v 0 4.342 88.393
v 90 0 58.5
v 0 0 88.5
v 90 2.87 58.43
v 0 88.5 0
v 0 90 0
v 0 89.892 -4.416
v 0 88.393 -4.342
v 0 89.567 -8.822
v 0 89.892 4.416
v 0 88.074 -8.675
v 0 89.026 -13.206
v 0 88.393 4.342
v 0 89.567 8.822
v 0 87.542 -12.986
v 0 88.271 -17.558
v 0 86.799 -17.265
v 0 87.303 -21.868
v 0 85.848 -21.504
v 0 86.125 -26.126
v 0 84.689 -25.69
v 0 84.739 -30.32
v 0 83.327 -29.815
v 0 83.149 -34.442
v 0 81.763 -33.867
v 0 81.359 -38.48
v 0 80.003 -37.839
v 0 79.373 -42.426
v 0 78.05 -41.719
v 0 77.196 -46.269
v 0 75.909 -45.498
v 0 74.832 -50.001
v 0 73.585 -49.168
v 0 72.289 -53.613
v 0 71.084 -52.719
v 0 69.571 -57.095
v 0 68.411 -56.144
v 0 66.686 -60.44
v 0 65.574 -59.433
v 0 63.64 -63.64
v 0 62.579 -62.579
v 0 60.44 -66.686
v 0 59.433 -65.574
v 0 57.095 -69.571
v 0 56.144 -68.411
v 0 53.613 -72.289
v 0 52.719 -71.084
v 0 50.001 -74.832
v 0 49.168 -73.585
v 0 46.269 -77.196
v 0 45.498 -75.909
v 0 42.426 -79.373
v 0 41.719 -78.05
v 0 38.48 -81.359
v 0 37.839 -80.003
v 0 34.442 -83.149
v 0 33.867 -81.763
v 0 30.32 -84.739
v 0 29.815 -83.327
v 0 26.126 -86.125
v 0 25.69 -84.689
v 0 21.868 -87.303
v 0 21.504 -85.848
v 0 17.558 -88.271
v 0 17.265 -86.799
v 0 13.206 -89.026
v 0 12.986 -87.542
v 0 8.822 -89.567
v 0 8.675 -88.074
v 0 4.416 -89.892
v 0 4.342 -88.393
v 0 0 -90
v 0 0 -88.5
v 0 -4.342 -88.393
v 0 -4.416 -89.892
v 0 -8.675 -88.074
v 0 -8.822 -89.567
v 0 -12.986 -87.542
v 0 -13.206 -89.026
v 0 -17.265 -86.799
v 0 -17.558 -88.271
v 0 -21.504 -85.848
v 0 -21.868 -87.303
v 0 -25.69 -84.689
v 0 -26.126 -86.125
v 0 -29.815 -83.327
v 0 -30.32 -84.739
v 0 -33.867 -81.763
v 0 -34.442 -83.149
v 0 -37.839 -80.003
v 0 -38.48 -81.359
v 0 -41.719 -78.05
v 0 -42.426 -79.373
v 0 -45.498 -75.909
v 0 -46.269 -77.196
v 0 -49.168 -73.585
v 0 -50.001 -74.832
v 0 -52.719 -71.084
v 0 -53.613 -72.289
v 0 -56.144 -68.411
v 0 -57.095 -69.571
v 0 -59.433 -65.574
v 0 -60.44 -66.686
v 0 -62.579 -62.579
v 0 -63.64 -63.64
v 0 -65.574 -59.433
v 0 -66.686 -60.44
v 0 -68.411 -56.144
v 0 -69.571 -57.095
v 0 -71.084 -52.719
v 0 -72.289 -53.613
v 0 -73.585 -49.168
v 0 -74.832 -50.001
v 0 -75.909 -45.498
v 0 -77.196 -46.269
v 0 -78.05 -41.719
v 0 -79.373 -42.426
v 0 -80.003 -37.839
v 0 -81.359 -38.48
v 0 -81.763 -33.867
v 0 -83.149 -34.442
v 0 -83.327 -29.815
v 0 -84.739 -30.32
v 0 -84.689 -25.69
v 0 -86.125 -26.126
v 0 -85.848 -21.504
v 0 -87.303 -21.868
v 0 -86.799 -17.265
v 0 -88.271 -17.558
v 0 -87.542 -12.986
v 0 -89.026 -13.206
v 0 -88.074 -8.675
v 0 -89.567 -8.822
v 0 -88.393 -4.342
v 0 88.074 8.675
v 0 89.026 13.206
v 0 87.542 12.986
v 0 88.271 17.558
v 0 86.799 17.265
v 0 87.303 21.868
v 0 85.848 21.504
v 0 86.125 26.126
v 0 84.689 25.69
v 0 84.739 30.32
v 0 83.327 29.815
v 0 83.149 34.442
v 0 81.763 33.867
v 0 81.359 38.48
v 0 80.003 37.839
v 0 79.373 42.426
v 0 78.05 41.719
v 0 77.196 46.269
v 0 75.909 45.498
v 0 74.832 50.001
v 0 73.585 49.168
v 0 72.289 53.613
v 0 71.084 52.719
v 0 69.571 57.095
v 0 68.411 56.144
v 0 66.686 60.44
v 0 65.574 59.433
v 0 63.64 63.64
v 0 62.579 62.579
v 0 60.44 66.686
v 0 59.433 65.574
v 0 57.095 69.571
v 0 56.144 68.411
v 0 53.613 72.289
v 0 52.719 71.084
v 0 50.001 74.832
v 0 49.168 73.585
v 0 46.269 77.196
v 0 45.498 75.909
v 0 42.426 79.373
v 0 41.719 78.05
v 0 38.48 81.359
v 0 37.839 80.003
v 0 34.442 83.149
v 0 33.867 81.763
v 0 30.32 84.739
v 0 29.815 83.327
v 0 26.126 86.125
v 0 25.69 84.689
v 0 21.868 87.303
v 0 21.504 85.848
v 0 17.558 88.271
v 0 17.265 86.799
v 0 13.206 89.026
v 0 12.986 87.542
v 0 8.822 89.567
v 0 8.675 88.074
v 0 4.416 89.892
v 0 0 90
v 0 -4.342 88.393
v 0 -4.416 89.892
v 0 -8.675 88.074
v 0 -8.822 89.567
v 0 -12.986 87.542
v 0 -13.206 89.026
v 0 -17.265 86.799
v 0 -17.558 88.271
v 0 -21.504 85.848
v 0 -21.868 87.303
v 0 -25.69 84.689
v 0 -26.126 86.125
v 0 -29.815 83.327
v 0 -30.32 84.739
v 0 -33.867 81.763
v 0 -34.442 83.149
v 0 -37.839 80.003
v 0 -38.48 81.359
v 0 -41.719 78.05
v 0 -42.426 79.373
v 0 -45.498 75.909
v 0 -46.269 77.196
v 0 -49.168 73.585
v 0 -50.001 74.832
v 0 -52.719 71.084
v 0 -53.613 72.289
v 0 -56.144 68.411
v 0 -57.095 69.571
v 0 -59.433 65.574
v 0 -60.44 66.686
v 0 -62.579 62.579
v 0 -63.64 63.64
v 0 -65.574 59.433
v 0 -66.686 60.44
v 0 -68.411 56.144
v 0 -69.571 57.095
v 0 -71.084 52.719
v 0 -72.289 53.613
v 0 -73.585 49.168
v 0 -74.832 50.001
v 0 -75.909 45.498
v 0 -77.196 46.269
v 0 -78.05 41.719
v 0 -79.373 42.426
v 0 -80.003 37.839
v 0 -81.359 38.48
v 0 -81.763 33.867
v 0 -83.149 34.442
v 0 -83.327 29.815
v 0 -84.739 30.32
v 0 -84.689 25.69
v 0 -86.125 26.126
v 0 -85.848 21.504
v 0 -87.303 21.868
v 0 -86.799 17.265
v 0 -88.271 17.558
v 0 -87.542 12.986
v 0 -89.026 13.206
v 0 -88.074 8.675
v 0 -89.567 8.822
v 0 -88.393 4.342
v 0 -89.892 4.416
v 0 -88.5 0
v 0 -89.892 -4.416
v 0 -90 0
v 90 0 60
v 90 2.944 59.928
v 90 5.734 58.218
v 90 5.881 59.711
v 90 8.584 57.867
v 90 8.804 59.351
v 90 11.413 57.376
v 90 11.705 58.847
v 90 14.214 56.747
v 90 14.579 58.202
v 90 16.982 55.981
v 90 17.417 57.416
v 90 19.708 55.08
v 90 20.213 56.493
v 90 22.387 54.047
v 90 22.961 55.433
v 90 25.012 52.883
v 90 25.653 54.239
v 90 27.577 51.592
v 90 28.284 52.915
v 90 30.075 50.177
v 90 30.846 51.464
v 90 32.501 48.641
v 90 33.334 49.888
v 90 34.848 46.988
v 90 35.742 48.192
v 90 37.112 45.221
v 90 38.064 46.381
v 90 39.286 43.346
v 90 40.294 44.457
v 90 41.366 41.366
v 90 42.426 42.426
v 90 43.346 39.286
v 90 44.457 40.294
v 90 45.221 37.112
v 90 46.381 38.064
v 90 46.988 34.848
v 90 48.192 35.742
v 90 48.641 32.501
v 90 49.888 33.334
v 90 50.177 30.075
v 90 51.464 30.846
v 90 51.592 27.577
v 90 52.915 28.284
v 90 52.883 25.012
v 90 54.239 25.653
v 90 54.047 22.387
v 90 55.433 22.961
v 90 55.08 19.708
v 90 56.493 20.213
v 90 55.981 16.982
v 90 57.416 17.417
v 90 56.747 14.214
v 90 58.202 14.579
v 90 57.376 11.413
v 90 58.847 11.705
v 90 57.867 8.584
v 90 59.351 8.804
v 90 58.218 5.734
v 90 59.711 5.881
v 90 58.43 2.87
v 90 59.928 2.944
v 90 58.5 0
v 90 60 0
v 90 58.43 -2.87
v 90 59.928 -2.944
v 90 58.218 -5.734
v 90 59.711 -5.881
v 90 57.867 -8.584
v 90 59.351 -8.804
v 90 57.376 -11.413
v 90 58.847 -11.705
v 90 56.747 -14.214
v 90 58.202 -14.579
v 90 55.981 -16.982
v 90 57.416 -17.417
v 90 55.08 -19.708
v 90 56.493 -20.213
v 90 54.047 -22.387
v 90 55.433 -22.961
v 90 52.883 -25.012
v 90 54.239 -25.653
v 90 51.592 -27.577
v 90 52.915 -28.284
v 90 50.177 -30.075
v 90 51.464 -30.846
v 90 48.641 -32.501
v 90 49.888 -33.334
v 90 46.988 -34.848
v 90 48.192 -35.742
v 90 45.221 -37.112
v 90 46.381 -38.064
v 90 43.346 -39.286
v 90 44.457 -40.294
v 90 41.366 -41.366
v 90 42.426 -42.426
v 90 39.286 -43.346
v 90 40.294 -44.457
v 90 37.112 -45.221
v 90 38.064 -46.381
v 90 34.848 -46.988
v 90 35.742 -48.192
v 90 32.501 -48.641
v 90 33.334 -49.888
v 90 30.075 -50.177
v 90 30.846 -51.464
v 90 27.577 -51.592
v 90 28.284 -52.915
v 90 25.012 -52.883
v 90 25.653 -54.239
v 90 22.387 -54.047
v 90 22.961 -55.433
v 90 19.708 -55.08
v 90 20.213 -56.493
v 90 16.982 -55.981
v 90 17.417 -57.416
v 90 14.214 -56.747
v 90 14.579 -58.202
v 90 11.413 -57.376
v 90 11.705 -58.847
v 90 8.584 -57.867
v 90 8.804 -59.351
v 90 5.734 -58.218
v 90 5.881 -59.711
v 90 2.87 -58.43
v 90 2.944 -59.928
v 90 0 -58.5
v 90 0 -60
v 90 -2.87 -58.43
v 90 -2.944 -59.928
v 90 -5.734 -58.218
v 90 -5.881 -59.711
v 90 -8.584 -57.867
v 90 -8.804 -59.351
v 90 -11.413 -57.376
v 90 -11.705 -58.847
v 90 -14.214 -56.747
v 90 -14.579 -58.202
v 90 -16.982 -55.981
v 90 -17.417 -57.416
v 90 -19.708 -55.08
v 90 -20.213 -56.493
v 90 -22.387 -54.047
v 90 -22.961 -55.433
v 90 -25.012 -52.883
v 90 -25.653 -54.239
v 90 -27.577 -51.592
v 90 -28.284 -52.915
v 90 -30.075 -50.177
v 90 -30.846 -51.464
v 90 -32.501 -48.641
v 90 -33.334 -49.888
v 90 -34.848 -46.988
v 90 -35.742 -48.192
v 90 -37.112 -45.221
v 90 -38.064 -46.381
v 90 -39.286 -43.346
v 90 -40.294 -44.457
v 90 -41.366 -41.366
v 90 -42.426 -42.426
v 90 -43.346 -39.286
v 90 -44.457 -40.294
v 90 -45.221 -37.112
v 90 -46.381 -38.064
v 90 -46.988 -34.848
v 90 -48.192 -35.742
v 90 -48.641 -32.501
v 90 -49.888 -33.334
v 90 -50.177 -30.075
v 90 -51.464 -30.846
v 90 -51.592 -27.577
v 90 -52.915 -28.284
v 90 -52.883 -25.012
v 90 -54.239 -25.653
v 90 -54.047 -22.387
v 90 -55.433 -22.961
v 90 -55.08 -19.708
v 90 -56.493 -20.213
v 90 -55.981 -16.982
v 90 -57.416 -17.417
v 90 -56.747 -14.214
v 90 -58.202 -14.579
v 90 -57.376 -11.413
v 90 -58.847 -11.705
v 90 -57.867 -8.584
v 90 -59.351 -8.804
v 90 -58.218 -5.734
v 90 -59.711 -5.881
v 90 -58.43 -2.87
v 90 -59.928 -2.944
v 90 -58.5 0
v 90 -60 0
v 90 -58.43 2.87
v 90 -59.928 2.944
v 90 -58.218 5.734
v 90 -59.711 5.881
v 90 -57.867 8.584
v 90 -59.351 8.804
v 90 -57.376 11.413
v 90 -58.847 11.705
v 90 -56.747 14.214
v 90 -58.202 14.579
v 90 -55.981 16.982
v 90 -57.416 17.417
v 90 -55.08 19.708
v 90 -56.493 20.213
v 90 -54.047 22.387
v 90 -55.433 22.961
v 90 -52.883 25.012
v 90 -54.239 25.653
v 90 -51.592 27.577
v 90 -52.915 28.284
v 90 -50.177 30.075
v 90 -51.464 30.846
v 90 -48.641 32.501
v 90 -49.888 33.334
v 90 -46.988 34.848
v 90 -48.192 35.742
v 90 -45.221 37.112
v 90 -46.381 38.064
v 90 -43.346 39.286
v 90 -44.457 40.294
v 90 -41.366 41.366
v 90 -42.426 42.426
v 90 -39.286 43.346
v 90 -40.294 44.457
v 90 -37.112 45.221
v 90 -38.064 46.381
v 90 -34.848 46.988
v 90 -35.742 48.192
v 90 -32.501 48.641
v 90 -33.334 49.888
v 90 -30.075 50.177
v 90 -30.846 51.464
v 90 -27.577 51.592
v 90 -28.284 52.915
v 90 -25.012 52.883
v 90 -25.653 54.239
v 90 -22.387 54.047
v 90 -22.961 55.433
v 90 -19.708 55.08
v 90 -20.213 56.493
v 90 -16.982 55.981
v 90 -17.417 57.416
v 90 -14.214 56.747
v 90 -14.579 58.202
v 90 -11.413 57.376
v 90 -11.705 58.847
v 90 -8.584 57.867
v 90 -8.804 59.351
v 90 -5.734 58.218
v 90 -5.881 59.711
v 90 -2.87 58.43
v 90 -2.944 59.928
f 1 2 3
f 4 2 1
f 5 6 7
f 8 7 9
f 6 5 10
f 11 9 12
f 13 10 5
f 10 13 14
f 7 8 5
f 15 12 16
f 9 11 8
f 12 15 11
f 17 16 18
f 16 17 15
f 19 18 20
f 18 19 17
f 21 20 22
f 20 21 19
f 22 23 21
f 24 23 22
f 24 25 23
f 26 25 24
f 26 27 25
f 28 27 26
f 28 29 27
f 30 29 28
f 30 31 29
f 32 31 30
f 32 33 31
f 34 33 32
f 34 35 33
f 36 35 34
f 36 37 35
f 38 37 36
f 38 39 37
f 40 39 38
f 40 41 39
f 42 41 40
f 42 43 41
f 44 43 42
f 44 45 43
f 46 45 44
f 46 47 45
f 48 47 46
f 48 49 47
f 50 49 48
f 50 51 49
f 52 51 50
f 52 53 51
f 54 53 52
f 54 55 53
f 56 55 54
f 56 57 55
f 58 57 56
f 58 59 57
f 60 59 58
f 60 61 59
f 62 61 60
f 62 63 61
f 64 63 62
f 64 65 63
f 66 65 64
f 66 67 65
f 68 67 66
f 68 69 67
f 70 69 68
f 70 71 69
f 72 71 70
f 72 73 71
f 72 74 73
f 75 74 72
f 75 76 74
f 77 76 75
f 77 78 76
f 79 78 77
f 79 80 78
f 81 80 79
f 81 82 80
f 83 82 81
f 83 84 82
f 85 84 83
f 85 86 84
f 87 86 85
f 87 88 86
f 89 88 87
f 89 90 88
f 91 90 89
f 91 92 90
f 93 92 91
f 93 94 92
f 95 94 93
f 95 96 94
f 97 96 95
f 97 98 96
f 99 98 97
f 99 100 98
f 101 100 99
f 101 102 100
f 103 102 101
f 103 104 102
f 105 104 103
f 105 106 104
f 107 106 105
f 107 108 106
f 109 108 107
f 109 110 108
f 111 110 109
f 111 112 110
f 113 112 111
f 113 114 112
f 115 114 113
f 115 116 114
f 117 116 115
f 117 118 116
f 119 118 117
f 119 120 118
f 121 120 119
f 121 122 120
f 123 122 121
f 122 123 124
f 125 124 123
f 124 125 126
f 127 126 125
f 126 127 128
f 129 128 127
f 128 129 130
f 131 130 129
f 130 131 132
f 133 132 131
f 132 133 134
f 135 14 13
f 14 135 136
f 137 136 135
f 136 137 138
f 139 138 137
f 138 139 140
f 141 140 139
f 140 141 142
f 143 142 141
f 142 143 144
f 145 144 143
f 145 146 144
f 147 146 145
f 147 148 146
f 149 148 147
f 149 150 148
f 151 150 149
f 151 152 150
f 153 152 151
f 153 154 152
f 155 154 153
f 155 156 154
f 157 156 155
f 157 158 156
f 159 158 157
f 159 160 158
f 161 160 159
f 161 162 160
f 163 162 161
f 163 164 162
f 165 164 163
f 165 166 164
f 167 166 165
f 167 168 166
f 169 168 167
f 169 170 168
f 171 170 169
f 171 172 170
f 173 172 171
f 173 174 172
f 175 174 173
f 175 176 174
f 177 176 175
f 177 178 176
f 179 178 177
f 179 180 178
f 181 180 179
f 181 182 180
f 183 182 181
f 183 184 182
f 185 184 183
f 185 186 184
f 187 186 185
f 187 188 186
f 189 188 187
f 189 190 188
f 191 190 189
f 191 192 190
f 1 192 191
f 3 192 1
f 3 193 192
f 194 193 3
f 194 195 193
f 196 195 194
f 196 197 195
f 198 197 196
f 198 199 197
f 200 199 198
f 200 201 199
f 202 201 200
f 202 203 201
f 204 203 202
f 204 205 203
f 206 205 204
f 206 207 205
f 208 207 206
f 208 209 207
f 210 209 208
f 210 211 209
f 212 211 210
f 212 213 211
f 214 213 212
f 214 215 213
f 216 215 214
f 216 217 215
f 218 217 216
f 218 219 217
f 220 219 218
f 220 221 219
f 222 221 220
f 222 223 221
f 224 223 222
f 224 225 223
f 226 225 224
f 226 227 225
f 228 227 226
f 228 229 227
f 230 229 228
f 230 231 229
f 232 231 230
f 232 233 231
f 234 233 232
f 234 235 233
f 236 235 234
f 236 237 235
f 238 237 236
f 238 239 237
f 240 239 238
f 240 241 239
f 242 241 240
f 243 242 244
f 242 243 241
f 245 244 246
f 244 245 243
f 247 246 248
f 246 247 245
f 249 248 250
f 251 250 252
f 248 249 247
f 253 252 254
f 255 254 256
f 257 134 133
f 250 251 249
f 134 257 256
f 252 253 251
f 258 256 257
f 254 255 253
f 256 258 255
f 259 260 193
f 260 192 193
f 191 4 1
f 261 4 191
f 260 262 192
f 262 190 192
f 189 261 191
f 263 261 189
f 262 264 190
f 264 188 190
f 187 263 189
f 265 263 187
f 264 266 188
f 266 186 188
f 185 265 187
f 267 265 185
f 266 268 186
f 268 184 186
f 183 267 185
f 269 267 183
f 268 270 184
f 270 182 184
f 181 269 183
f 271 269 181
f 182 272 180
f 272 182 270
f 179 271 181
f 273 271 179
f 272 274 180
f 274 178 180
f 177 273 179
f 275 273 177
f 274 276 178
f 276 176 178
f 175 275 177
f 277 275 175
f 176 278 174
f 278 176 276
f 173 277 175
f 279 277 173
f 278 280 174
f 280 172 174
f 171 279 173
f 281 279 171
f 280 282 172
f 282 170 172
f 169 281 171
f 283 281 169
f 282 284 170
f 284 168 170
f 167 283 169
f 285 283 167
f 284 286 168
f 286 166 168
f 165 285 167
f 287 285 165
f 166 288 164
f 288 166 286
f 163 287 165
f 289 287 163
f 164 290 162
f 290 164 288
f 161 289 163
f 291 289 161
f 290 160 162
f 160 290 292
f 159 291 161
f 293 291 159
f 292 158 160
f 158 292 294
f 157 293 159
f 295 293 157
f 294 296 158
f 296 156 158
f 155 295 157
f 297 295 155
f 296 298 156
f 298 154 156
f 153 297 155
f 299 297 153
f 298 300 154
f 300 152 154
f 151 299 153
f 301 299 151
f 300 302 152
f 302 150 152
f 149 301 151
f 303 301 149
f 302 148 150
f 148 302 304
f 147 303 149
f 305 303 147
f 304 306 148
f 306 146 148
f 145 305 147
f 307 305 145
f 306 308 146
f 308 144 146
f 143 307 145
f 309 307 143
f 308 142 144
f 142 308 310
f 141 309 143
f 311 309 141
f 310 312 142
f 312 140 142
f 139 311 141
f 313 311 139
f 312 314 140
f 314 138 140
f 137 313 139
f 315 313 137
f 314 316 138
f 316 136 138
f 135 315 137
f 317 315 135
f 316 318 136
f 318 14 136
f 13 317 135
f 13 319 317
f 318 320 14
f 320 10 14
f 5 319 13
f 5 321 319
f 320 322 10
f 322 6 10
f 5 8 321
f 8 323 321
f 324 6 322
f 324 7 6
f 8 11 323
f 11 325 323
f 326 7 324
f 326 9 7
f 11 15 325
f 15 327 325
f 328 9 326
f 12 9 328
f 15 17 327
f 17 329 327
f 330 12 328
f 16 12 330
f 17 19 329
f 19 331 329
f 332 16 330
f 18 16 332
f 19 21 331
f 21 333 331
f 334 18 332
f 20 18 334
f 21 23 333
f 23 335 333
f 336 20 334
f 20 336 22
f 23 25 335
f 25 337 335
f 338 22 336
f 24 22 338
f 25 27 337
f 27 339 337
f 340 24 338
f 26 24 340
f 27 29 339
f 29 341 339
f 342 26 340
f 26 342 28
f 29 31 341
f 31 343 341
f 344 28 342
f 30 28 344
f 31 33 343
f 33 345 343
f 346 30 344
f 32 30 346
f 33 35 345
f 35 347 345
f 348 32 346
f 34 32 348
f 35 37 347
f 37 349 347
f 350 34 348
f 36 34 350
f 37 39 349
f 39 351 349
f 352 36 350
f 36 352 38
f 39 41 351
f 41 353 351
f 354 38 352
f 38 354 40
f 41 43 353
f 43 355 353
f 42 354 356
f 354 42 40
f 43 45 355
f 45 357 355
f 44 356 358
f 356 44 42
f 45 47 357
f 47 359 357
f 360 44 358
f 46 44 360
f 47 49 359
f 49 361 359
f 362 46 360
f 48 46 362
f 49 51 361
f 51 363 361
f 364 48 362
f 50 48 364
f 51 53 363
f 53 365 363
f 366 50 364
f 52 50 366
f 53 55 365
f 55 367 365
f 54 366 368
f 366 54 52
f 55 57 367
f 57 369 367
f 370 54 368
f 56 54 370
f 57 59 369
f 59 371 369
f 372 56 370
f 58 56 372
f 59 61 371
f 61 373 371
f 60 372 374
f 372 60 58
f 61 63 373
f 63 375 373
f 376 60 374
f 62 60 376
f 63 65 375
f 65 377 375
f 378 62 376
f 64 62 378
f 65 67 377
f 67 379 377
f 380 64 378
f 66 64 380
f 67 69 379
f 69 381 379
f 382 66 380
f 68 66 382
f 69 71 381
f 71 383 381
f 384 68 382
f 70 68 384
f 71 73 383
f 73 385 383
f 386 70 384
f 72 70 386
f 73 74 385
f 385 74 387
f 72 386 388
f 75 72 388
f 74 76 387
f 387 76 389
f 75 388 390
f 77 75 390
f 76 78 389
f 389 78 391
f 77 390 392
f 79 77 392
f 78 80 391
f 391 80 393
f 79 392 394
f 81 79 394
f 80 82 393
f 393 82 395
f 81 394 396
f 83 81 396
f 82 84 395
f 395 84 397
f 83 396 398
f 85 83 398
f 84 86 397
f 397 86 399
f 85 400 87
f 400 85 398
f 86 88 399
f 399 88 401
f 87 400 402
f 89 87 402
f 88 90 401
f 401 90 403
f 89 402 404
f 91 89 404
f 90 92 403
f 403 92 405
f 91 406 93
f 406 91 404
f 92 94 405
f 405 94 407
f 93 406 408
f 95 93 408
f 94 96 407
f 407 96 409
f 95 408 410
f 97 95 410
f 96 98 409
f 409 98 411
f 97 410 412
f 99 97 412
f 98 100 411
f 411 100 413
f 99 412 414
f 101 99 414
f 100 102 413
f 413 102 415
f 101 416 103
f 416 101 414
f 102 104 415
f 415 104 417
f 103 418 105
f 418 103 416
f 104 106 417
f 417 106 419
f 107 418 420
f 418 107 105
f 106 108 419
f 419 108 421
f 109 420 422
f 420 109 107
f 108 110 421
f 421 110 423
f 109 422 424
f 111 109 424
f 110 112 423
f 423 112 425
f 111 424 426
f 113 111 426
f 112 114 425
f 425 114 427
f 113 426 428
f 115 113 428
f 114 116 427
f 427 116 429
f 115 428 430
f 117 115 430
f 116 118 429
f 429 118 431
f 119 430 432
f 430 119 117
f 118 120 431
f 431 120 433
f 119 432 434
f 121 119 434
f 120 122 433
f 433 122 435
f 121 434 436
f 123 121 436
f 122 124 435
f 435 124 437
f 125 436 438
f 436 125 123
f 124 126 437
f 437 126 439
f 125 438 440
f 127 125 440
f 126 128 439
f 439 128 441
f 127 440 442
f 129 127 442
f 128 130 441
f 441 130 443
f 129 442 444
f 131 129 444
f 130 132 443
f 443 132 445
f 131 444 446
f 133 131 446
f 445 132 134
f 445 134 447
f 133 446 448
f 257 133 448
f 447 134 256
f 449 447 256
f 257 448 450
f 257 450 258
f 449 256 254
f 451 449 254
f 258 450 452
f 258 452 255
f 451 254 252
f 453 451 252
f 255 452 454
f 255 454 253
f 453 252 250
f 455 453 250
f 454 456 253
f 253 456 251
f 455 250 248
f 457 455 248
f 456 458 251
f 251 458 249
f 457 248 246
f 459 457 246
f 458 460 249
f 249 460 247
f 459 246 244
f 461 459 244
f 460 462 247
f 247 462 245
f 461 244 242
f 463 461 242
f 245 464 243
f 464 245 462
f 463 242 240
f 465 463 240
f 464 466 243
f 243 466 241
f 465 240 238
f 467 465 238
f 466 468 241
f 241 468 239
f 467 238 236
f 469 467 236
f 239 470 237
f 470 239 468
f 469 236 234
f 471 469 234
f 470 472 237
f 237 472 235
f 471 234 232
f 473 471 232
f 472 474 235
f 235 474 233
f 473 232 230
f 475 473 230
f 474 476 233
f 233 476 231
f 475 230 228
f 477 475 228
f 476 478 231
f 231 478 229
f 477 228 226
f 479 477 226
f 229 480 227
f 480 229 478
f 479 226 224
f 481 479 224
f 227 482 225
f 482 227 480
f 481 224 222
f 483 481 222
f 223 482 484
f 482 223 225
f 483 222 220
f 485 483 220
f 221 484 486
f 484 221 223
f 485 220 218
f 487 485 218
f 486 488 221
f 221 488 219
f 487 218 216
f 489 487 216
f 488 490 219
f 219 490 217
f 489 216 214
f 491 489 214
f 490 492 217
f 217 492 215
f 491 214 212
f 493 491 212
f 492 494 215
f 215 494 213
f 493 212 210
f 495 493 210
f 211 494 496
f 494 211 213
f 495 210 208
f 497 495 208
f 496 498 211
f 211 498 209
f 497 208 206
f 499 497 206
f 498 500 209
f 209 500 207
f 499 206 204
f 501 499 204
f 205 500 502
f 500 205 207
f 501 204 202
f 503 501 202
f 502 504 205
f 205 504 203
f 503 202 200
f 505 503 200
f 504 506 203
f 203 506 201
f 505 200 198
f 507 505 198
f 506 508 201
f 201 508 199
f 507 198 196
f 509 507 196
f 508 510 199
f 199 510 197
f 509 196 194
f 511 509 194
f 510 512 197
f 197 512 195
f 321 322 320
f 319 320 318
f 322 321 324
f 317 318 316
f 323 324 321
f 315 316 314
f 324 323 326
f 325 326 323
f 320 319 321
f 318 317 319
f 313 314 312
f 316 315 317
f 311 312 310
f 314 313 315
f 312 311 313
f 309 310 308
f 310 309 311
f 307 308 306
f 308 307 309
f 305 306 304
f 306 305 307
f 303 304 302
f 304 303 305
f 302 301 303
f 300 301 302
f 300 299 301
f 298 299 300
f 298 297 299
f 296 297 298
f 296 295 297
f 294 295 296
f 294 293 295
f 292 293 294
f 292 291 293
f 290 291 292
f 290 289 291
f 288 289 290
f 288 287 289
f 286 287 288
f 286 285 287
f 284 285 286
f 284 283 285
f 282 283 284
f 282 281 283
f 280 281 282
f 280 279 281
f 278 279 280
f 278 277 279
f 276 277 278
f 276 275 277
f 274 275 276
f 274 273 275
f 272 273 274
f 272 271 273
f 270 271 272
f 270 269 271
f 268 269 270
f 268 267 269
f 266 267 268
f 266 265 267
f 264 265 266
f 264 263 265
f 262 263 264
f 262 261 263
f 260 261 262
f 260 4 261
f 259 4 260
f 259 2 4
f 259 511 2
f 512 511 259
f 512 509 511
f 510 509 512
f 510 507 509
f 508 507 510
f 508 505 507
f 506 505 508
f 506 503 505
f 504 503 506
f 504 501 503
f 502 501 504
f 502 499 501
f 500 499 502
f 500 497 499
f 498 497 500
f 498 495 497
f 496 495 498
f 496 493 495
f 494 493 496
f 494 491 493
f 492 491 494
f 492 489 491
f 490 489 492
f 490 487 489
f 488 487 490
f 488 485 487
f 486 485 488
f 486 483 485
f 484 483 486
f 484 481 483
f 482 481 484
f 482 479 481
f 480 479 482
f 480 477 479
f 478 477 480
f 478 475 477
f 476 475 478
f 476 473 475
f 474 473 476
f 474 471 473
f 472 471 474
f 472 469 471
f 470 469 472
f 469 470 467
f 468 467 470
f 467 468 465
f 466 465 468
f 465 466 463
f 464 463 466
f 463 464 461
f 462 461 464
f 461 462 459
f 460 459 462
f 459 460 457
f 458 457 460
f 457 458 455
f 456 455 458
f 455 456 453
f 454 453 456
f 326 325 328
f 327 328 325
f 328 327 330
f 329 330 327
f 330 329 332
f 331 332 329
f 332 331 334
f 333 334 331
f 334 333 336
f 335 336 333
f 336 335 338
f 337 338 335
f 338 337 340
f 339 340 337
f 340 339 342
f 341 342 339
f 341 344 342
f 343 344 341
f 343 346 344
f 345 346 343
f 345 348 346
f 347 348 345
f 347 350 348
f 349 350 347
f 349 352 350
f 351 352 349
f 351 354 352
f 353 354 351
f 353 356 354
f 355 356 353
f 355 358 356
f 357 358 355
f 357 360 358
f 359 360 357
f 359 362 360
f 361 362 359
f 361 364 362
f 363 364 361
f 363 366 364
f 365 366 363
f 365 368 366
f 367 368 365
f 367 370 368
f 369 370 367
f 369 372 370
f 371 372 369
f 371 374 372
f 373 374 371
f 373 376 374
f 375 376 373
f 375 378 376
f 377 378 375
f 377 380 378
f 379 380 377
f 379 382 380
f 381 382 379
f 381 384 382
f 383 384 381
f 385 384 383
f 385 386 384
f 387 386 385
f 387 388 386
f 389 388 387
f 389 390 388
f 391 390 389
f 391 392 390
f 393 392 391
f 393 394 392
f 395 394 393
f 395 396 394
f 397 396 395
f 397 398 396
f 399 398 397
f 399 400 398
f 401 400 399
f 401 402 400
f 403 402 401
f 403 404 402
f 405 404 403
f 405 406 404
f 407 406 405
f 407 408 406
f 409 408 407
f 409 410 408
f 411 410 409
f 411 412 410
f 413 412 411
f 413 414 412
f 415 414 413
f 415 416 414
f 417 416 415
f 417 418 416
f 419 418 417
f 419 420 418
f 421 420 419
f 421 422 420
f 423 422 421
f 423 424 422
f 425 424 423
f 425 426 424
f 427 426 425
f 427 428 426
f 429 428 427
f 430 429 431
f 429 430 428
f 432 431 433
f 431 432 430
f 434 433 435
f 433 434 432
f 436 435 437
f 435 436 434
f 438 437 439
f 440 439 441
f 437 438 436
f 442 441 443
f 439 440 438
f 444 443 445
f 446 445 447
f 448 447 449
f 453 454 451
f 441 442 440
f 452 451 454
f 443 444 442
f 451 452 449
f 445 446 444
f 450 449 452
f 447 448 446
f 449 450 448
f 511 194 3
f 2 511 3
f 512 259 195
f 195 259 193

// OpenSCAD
// file: ../utils/parametric_helpers.scad
/**
 * @file parametric_helpers.scad
 * @brief Parametric 3D Modeling Utility Library
 * @details Contains shared constants, modules, and functions for geometric arraying,
 *          rounded cylinders, and coordinate transformations.
 * 
 * Copyright (c) 2026 AEGIS-TF1 Systems Development Group.
 */

// Global Constants
PI = 3.14159265358979323846;
GOLDEN_RATIO = 1.618033988749894;
TOLERANCE = 0.05;

// Functions
function deg2rad(d) = d * PI / 180.0;
function rad2deg(r) = r * 180.0 / PI;
function lerp(a, b, t) = a + (b - a) * t;

// Modules

/**
 * @brief Distributes children shapes in a circular array
 * @param n Number of instances
 * @param radius Radius of array circle
 */
module circular_array(n, radius) {
    for (i = [0 : n - 1]) {
        angle = i * 360.0 / n;
        rotate([0, 0, angle])
        translate([radius, 0, 0])
        children();
    }
}

/**
 * @brief Distributes children shapes in a linear array along X-axis
 * @param n Number of instances
 * @param spacing Distance between instances
 */
module linear_array(n, spacing) {
    for (i = [0 : n - 1]) {
        translate([i * spacing, 0, 0])
        children();
    }
}

/**
 * @brief Hollow cylinder (tube) along Z-axis
 * @param h Tube height
 * @param outer_r Outer radius
 * @param inner_r Inner radius
 * @param fn Resolution
 */
module tube(h, outer_r, inner_r, fn=64) {
    difference() {
        cylinder(h=h, r=outer_r, center=true, $fn=fn);
        cylinder(h=h + TOLERANCE * 2.0, r=inner_r, center=true, $fn=fn);
    }
}

/**
 * @brief Torus shape centered at origin
 * @param R Major radius (ring center distance)
 * @param r Minor radius (cross section radius)
 * @param fn Resolution
 */
module torus(R, r, fn=64) {
    rotate_extrude($fn=fn)
    translate([R, 0, 0])
    circle(r=r, $fn=fn);
}

/**
 * @brief Rounded cylinder (filleted top and bottom edges) using Minkowski
 * @param h Height
 * @param r Radius
 * @param fillet_r Edge radius
 * @param fn Resolution
 */
module rounded_cylinder(h, r, fillet_r, fn=64) {
    minkowski() {
        cylinder(h = h - 2.0 * fillet_r, r = r - fillet_r, center = true, $fn = fn);
        sphere(r = fillet_r, $fn = fn);
    }
}

/**
 * @brief 2D fillet helper
 * @param r Fillet radius
 */
module fillet_2d(r) {
    difference() {
        square([r, r]);
        translate([r, r])
        circle(r=r, $fn=64);
    }
}

/**
 * @brief 2D chamfer helper
 * @param size Chamfer length
 */
module chamfer_2d(size) {
    polygon(points=[[0,0], [size,0], [0,size]]);
}

/**
 * @brief Ball bearing assembly (inner ring, outer ring, balls)
 */
module bearing_assembly(inner_dia, outer_dia, width, num_balls=10) {
    color("silver")
    difference() {
        // Outer ring
        cylinder(h=width, r=outer_dia / 2.0, center=true, $fn=64);
        cylinder(h=width + 1.0, r=(outer_dia + inner_dia)/4.0 + (outer_dia - inner_dia)/8.0 * 0.8, center=true, $fn=64);
    }
    color("silver")
    difference() {
        // Inner ring
        cylinder(h=width, r=(outer_dia + inner_dia)/4.0 - (outer_dia - inner_dia)/8.0 * 0.8, center=true, $fn=64);
        cylinder(h=width + 1.0, r=inner_dia / 2.0, center=true, $fn=64);
    }
    // Balls (arranged in circular array)
    color([0.9, 0.92, 0.95]) // Chrome steel bearing balls
    let (ball_radius = (outer_dia - inner_dia) / 8.0, pitch_radius = (outer_dia + inner_dia) / 4.0) {
        circular_array(n=num_balls, radius=pitch_radius)
        sphere(r=ball_radius * 0.95, $fn=32);
    }
}

/**
 * @brief Bolted assembly flange with hexagonal head bolts
 */
module bolted_flange(outer_r, inner_r, thickness, num_bolts=16, bolt_r=2.5) {
    color("darkgray")
    difference() {
        // Flange ring
        cylinder(h=thickness, r=outer_r, center=true, $fn=128);
        cylinder(h=thickness + 1.0, r=inner_r, center=true, $fn=128);
        
        // Bolt holes
        circular_array(n=num_bolts, radius=(outer_r + inner_r)/2.0)
        cylinder(h=thickness + 2.0, r=bolt_r, center=true, $fn=16);
    }
    // Hexagonal bolts
    color([0.72, 0.73, 0.75]) // Hardened steel zinc-plated bolts
    circular_array(n=num_bolts, radius=(outer_r + inner_r)/2.0)
    translate([0, 0, thickness/2.0])
    cylinder(h=bolt_r * 1.5, r=bolt_r * 1.6, center=false, $fn=6);
}

/**
 * @brief Dovetail slot profile shape for cutting blade roots
 */
module dovetail_slot_profile(width, height) {
    polygon(points=[
        [-width * 0.76 / 2.0, height/2.0],
        [width * 0.76 / 2.0, height/2.0],
        [width/2.0, -height/2.0],
        [-width/2.0, -height/2.0]
    ]);
}

/*
// Preview Examples
translate([0, 0, 0]) {
    // Tube example
    color("teal") tube(h=30, outer_r=15, inner_r=12);
    
    // Torus example
    translate([45, 0, 0])
    color("crimson") torus(R=20, r=4);

    // Rounded Cylinder example
    translate([-45, 0, 0])
    color([0.75, 0.65, 0.4]) rounded_cylinder(h=25, r=10, fillet_r=2.0);

    // Bearing example
    translate([0, 45, 0])
    bearing_assembly(inner_dia=20, outer_dia=40, width=12);

    // Bolted Flange example
    translate([0, -45, 0])
    bolted_flange(outer_r=30, inner_r=20, thickness=6, num_bolts=12);
}
*/
// main file
/**
 * @file convergent_nozzle.scad
 * @brief Convergent Exhaust Nozzle 3D Model
 * @details Models a smooth convergent contour using rotate_extrude and Bezier-like wall profiles.
 * 
 * Copyright (c) 2026 AEGIS-TF1 Systems Development Group.
 */

use <../utils/parametric_helpers.scad>

/**
 * @brief Convergent exhaust nozzle shell
 * @param inlet_diameter Inlet diameter matching turbine outer duct (mm)
 * @param exit_diameter Exit throat diameter (mm)
 * @param length Length along nozzle axis (mm)
 */
module convergent_nozzle(inlet_diameter=180, exit_diameter=120, length=90) {
    inlet_r = inlet_diameter / 2.0;
    exit_r = exit_diameter / 2.0;
    thickness = 1.5; // sheet metal thickness

    color("dimgrey")
    translate([length/2.0, 0, 0])
    rotate([0, 90, 0]) // Align nozzle along X-axis
    difference() {
        // Tapering outer profile
        rotate_extrude($fn=128)
        polygon(points=[
            [inlet_r, -length/2.0],
            [exit_r, length/2.0],
            [exit_r - thickness, length/2.0],
            [inlet_r - thickness, -length/2.0]
        ]);

        // Clean out central core if any polygon overlaps occurred
        cylinder(h=length + 2.0, r=exit_r - thickness, center=true, $fn=128);
    }
}

// Preview
convergent_nozzle();
